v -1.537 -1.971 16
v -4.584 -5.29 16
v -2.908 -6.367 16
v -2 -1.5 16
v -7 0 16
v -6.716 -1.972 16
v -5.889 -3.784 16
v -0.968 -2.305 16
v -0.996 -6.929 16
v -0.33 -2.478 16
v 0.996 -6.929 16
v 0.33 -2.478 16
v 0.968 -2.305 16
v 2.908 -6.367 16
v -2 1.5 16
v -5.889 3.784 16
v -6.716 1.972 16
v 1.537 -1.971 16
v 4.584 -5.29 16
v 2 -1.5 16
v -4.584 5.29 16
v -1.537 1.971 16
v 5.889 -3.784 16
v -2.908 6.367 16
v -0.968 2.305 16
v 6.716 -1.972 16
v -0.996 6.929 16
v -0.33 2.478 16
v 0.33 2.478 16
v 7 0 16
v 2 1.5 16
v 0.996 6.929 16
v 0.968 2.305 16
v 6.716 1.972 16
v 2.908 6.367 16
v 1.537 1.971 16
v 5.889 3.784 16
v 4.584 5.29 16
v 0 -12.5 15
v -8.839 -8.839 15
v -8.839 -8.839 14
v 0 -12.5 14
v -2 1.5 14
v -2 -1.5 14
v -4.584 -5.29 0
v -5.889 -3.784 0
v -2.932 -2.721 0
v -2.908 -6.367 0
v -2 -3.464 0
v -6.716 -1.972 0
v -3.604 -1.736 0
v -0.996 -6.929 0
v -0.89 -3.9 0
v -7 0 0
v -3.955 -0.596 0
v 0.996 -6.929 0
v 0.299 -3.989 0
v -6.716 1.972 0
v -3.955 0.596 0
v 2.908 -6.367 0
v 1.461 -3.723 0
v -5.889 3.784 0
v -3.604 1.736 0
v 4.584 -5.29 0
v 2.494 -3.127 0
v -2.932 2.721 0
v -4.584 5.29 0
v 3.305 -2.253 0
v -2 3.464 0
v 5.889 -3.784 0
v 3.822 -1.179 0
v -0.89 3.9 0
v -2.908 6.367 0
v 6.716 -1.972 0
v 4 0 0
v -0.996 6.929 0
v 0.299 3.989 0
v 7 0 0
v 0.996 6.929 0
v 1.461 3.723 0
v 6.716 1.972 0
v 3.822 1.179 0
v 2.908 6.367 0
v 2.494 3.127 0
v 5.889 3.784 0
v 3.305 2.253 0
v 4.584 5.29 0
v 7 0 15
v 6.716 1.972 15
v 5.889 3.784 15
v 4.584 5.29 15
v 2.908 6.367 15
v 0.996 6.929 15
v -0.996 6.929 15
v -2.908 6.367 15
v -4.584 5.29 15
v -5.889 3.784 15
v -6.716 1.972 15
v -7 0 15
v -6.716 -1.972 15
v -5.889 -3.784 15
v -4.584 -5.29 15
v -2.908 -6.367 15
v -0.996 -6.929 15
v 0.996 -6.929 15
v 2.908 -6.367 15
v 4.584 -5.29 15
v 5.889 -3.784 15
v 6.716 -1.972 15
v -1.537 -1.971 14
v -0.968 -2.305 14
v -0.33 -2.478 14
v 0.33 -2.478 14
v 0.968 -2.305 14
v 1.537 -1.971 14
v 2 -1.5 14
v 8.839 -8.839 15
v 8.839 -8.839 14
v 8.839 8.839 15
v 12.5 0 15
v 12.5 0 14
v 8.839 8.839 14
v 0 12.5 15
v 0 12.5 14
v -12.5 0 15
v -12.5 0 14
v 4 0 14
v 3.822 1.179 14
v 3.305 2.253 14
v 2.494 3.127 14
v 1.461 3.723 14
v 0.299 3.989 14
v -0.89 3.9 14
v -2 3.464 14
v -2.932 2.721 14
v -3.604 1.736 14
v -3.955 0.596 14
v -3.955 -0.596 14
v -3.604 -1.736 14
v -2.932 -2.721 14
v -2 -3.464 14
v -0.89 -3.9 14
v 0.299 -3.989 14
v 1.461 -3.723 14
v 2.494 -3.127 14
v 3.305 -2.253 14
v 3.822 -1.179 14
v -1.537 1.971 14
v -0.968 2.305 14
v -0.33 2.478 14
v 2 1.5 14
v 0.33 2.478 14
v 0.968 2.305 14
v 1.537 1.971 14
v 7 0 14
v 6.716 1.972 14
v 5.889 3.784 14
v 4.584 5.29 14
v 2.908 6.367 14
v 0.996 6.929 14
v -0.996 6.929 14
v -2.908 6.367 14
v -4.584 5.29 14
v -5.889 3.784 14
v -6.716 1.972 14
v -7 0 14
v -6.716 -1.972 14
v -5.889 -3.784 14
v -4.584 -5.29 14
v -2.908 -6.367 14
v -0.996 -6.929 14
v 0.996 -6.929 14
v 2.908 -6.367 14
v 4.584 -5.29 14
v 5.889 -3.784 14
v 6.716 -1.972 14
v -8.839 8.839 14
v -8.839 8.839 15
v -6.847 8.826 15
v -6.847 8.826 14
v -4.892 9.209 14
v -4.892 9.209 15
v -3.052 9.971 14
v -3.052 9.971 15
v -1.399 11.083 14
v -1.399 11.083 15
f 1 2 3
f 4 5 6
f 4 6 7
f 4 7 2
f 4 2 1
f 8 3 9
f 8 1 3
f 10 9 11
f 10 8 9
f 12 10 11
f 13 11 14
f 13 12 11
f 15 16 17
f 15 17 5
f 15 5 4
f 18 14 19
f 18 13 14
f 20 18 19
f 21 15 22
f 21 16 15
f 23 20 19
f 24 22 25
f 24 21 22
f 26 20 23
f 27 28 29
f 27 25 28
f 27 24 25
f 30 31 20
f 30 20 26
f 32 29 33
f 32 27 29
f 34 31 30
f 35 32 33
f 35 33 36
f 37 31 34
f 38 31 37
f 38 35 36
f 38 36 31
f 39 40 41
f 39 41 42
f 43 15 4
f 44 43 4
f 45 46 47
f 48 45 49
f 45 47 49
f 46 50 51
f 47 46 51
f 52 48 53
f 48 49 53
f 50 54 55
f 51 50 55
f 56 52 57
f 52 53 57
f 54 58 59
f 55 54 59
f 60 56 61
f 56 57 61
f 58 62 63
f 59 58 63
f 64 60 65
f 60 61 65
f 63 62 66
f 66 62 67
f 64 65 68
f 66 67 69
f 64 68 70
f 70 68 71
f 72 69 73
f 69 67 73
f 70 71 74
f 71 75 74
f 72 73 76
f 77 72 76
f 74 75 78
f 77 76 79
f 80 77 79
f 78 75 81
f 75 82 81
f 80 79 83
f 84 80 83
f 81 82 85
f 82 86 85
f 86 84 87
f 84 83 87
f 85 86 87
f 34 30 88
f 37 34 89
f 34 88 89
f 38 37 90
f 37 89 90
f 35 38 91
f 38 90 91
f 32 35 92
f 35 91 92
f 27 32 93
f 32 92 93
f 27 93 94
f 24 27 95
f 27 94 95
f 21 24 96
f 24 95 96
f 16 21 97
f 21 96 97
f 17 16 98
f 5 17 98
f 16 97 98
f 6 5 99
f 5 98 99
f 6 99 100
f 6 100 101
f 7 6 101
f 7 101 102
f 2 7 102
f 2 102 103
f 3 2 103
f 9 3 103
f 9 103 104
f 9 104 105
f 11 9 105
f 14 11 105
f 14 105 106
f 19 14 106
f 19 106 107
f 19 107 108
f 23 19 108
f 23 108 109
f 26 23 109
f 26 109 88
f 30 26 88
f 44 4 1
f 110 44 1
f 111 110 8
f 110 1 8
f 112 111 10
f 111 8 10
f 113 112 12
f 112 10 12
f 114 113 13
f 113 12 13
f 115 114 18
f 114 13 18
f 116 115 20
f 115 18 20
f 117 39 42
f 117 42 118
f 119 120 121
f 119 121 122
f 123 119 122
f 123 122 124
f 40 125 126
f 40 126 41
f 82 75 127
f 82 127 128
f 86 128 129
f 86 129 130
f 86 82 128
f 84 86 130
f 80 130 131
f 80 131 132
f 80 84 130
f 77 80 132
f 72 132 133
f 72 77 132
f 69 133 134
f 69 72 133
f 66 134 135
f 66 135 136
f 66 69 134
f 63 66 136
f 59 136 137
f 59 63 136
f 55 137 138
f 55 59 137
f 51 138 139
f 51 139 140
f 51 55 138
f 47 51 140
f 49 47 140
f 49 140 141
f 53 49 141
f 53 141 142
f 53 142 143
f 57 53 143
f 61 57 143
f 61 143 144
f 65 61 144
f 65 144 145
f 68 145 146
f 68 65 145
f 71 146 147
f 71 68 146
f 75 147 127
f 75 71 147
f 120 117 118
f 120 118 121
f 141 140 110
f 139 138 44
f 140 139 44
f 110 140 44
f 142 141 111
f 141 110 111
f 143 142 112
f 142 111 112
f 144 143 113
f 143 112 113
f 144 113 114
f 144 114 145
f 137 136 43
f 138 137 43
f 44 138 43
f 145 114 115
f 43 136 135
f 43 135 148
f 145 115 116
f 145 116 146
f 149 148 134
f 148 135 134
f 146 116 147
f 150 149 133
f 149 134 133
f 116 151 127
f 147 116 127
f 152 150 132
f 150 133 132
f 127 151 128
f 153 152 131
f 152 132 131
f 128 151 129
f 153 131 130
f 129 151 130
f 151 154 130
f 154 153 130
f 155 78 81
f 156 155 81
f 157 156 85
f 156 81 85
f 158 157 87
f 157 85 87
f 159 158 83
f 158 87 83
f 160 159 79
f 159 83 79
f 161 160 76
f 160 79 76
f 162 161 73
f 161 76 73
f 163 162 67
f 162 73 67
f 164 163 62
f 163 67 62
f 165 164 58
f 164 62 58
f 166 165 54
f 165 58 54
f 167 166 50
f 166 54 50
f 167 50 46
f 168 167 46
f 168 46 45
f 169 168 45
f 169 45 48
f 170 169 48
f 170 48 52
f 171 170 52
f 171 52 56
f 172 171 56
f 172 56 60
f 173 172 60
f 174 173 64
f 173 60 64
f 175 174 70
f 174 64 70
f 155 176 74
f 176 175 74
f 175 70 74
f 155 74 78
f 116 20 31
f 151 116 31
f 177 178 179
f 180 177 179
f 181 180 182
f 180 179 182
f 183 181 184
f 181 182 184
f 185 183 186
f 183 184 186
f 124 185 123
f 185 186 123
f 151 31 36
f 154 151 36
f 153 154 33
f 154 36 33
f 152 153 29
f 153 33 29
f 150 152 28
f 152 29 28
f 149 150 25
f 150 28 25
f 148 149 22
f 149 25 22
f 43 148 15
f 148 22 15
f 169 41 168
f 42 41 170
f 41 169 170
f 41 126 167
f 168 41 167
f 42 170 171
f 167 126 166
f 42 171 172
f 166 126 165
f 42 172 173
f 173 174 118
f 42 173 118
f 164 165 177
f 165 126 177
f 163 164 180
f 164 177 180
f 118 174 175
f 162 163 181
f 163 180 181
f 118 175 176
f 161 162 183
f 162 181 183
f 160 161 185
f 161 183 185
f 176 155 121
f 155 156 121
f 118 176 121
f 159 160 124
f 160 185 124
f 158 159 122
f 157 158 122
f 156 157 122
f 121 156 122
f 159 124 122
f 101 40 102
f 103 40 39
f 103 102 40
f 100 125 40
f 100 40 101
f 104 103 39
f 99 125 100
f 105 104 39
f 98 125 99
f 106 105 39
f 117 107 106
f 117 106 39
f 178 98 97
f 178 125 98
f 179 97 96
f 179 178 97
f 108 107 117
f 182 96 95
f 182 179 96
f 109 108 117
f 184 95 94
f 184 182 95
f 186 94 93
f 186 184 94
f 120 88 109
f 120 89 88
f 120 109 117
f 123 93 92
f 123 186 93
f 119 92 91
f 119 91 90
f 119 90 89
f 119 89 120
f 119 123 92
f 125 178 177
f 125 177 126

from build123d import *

# Parameters (mm, degrees)
F0_R      = 7
F1_DEPTH  = 16
F4_DEPTH  = 1
F5_R      = 4
F6_DEPTH  = 14
F8_DEPTH  = 16.001
F10_DEPTH = 15.001
F12_DEPTH = 15.002


with BuildPart() as f1:
    # F0 (on Top) → F1 (new body)
    with BuildSketch(Plane.XY):
        Circle(F0_R)
    extrude(amount=F1_DEPTH)

    # F3 (on offset) → F4 (join)
    with BuildSketch(Plane.XY.offset(15)):
        Polygon((8.8388347648, 8.8388347648), (0, 12.5), (-8.8388347648, 8.8388347648), (-12.5, 0), (-8.8388347648, -8.8388347648), (0, -12.5), (8.8388347648, -8.8388347648), (12.5, 0), align=None)
    extrude(amount=-F4_DEPTH)

    # F5 (on Top) → F6 (cut, through all)
    with BuildSketch(Plane.XY):
        Circle(F5_R)
    extrude(amount=F6_DEPTH, mode=Mode.SUBTRACT)

    # F7 (on face) → F8 (cut, through all)
    with BuildSketch(Plane.XY.offset(16)):
        with BuildLine():
            Line((-2, 1.5), (-2, -1.5))
            ThreePointArc((-2, -1.5), (0, -2.5), (2, -1.5))
            Line((2, -1.5), (2, 1.5))
            ThreePointArc((2, 1.5), (0, 2.5), (-2, 1.5))
        make_face()
    extrude(amount=-F8_DEPTH, mode=Mode.SUBTRACT)


with BuildPart() as f10:
    # F9 (on face) → F10 (new body, through all)
    with BuildSketch(Plane.XY.offset(15)):
        with BuildLine():
            Line((0, 12.5), (-8.8388347648, 8.8388347648))
            ThreePointArc((-8.8388347648, 8.8388347648), (-3.9531824429, 9.5438266683), (0, 12.5))
        make_face()
    extrude(amount=-F10_DEPTH)


with BuildPart() as f12_tool:
    # F11 (on face) → F12 (new body, through all)
    with BuildSketch(Plane.XY.offset(15)):
        with BuildLine():
            ThreePointArc((-8.8388347648, 8.8388347648), (-3.9531824429, 9.5438266683), (0, 12.5))
            Line((0, 12.5), (-8.8388347648, 8.8388347648))
        make_face()
    extrude(amount=-F12_DEPTH)


with BuildPart() as f1_1:
    add(f1.part)

    # F12: cut by f12_tool
    add(f12_tool.part, mode=Mode.SUBTRACT)


with BuildPart() as f10_1:
    add(f10.part)

    # F12: cut by f12_tool
    add(f12_tool.part, mode=Mode.SUBTRACT)


solid = f1_1.part
